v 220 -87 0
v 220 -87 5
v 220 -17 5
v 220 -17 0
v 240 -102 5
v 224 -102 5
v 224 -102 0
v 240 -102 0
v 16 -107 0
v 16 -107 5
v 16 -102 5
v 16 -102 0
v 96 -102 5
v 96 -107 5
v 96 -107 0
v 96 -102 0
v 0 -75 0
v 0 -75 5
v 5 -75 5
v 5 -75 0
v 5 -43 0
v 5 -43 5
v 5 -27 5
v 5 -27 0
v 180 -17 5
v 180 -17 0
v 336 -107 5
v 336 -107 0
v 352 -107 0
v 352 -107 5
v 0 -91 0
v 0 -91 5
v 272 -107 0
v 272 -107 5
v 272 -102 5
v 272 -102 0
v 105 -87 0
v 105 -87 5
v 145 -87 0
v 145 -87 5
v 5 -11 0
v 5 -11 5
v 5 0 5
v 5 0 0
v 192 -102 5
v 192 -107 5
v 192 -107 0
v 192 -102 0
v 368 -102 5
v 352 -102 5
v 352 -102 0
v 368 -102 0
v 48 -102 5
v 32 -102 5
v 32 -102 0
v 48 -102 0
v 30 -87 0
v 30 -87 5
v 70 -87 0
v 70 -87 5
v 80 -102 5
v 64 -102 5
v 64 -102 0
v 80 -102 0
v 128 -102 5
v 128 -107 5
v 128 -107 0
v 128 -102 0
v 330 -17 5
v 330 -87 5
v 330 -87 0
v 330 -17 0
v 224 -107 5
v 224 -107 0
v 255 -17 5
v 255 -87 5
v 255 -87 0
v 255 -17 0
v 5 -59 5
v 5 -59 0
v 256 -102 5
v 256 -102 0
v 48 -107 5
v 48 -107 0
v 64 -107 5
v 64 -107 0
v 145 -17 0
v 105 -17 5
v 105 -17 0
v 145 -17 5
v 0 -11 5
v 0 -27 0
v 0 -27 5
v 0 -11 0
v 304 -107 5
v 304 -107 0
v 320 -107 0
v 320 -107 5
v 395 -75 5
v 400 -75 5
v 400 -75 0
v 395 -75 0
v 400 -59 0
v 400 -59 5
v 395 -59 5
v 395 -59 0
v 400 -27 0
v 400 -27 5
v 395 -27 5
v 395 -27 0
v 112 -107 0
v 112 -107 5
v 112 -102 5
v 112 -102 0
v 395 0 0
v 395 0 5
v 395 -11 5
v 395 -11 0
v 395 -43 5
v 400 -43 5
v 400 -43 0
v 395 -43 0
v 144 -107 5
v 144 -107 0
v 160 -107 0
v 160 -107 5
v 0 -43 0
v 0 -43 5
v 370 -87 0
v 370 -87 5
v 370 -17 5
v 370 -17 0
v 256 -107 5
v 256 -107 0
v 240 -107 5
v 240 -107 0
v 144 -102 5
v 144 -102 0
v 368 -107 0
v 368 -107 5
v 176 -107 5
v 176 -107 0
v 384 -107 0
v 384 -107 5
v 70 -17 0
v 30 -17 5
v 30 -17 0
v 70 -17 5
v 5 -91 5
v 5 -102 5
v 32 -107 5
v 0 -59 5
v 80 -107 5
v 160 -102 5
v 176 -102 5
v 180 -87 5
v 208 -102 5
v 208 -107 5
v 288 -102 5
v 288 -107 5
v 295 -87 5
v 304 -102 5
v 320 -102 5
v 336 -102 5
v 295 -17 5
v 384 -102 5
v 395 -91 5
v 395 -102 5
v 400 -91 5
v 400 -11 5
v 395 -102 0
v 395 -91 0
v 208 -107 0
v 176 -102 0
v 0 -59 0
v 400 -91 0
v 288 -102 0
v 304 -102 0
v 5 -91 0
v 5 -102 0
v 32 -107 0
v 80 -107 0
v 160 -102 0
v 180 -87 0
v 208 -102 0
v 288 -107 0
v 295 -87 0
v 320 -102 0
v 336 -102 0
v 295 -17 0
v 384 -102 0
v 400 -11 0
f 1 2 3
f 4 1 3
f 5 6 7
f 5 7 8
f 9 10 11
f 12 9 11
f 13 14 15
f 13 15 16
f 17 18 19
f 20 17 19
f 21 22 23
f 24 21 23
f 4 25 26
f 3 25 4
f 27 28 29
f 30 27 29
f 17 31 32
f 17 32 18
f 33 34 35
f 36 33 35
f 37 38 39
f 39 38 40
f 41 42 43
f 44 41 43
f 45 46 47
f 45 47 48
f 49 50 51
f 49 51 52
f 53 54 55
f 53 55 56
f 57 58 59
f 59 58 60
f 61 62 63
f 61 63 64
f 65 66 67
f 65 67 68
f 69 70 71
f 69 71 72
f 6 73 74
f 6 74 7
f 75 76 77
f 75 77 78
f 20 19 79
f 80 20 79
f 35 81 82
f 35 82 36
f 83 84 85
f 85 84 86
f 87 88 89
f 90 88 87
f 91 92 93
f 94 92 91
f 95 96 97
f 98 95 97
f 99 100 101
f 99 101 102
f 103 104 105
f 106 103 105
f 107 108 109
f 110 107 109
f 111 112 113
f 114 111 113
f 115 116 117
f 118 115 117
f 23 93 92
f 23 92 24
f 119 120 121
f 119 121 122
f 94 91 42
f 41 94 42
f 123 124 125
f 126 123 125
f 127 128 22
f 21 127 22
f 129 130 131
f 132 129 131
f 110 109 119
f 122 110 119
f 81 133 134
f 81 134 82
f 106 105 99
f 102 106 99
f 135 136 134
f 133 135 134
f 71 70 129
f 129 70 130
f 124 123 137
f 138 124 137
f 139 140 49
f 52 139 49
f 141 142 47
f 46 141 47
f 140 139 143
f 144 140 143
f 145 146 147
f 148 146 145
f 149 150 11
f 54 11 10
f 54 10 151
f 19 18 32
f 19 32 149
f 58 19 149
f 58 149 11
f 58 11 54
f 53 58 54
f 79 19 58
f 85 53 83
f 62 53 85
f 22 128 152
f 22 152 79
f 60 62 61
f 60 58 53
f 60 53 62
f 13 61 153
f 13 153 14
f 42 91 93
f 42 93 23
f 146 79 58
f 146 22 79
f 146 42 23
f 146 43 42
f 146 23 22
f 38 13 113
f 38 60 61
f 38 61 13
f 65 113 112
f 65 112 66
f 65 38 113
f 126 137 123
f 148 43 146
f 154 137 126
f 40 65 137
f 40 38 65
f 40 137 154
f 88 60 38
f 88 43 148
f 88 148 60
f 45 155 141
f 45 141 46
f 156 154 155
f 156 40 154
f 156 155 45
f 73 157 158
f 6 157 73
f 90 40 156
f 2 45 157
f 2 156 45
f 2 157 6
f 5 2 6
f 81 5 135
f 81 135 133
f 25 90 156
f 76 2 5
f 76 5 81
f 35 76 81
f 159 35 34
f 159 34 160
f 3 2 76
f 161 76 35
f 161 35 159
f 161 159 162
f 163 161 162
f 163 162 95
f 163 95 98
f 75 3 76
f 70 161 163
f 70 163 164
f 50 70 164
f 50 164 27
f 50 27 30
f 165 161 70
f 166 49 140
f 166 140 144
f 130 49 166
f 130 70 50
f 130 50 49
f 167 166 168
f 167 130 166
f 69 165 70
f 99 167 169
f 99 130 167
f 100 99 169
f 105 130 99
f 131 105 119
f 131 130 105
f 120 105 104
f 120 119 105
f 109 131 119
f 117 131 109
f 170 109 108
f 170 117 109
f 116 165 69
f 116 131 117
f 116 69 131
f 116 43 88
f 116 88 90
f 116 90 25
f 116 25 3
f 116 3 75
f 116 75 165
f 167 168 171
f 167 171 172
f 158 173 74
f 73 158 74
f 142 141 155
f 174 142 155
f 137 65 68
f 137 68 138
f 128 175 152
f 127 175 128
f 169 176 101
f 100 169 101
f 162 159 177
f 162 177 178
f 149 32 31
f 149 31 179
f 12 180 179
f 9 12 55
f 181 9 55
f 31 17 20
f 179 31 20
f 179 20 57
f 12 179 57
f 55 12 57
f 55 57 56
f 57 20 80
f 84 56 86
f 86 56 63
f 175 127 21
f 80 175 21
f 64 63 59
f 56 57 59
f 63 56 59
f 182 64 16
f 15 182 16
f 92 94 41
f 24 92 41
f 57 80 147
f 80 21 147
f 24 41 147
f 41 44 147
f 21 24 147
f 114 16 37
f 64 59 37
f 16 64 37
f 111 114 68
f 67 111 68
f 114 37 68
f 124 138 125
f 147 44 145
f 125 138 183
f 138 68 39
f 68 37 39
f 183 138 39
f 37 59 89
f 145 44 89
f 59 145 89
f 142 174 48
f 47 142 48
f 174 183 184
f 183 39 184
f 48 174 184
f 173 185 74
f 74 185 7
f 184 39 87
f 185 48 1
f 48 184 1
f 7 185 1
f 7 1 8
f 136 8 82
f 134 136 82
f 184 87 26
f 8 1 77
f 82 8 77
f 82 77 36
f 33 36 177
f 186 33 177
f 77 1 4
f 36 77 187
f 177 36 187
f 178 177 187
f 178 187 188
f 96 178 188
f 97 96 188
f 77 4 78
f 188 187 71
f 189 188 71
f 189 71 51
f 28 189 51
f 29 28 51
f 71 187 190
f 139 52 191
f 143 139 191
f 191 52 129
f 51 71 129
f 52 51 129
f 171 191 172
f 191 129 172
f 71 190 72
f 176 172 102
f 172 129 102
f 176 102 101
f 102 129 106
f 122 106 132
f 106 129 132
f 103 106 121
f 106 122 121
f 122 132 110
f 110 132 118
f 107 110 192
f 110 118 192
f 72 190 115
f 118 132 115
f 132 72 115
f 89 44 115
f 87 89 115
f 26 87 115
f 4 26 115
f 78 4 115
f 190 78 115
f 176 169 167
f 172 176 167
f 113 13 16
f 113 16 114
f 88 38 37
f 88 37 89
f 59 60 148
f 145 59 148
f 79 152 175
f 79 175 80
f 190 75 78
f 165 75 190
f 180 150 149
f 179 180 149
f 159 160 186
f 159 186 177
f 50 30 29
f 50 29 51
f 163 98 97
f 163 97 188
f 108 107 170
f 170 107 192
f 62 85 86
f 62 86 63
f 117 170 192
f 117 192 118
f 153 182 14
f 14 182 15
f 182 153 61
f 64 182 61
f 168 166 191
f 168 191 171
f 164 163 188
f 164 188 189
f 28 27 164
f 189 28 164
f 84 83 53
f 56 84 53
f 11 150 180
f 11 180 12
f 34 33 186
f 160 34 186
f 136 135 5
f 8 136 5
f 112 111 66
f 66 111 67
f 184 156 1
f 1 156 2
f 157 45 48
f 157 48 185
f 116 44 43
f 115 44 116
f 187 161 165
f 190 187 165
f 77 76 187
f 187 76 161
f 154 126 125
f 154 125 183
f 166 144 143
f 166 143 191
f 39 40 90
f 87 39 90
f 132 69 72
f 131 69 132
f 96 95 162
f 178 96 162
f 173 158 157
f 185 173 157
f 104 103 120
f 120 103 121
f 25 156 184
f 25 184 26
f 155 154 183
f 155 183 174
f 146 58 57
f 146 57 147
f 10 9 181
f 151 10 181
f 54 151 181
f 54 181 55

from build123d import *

# Parameters (mm, degrees)
ESQUISSE1_W                = 400
ESQUISSE1_H                = 107
BOSS_EXTRU_1_DEPTH         = 5
ESQUISSE2_W                = 5
ESQUISSE2_H                = 16
ENL_V_MAT_EXTRU_1_DEPTH    = 5
R_P_TITION_LIN_AIRE1_COUNT = 4
R_P_TITION_LIN_AIRE1_PITCH = 32
SYM_TRIE1_COPY_1_SKETCH_W  = 5
SYM_TRIE1_COPY_1_SKETCH_H  = 16
SYM_TRIE1_COPY_1_DEPTH     = 5
SYM_TRIE1_COPY_2_SKETCH_W  = 5
SYM_TRIE1_COPY_2_SKETCH_H  = 16
SYM_TRIE1_COPY_2_DEPTH     = 5
SYM_TRIE1_COPY_3_SKETCH_W  = 5
SYM_TRIE1_COPY_3_SKETCH_H  = 16
SYM_TRIE1_COPY_3_DEPTH     = 5
ESQUISSE3_W                = 16
ESQUISSE3_H                = 5
ENL_V_MAT_EXTRU_2_DEPTH    = 5
R_P_TITION_LIN_AIRE2_COUNT = 13
R_P_TITION_LIN_AIRE2_PITCH = 32
ESQUISSE4_W                = 40
ESQUISSE4_H                = 70
ENL_V_MAT_EXTRU_3_DEPTH    = 10
R_P_TITION_LIN_AIRE3_COUNT = 5
R_P_TITION_LIN_AIRE3_PITCH = 75


with BuildPart() as part:
    # Esquisse1 → Boss.-Extru.1 (new body)
    with BuildSketch(Plane.XY):
        with Locations((200, -53.5)):
            Rectangle(ESQUISSE1_W, ESQUISSE1_H)
    extrude(amount=BOSS_EXTRU_1_DEPTH)

    # Esquisse2 → Enlèv. mat.-Extru.1 (cut)
    with BuildSketch(Plane.XY.offset(5)):
        with Locations((2.5, -99)):
            Rectangle(ESQUISSE2_W, ESQUISSE2_H)
    enl_v_mat_extru_1 = extrude(amount=-ENL_V_MAT_EXTRU_1_DEPTH, mode=Mode.SUBTRACT)

    # Répétition linéaire1: Enlèv. mat.-Extru.1 ×4
    with Locations(*[(0, i * R_P_TITION_LIN_AIRE1_PITCH, 0) for i in range(1, R_P_TITION_LIN_AIRE1_COUNT)]):
        add(enl_v_mat_extru_1, mode=Mode.SUBTRACT)

    # Symétrie1: Enlèv. mat.-Extru.1 across plane
    add(enl_v_mat_extru_1.mirror(Plane.ZY.offset(-200)), mode=Mode.SUBTRACT)

    # Symétrie1 copy 1 sketch → Symétrie1 copy 1 (cut)
    with BuildSketch(Plane(origin=(400, 32, 5), x_dir=(-1, 0, 0), z_dir=(0, 0, 1))):
        with Locations((2.5, 99)):
            Rectangle(SYM_TRIE1_COPY_1_SKETCH_W, SYM_TRIE1_COPY_1_SKETCH_H)
    extrude(amount=-SYM_TRIE1_COPY_1_DEPTH, mode=Mode.SUBTRACT)

    # Symétrie1 copy 2 sketch → Symétrie1 copy 2 (cut)
    with BuildSketch(Plane(origin=(400, 64, 5), x_dir=(-1, 0, 0), z_dir=(0, 0, 1))):
        with Locations((2.5, 99)):
            Rectangle(SYM_TRIE1_COPY_2_SKETCH_W, SYM_TRIE1_COPY_2_SKETCH_H)
    extrude(amount=-SYM_TRIE1_COPY_2_DEPTH, mode=Mode.SUBTRACT)

    # Symétrie1 copy 3 sketch → Symétrie1 copy 3 (cut)
    with BuildSketch(Plane(origin=(400, 96, 5), x_dir=(-1, 0, 0), z_dir=(0, 0, 1))):
        with Locations((2.5, 99)):
            Rectangle(SYM_TRIE1_COPY_3_SKETCH_W, SYM_TRIE1_COPY_3_SKETCH_H)
    extrude(amount=-SYM_TRIE1_COPY_3_DEPTH, mode=Mode.SUBTRACT)

    # Esquisse3 → Enlèv. mat.-Extru.2 (cut)
    with BuildSketch(Plane.XY.offset(5)):
        with Locations((8, -104.5)):
            Rectangle(ESQUISSE3_W, ESQUISSE3_H)
    enl_v_mat_extru_2 = extrude(amount=-ENL_V_MAT_EXTRU_2_DEPTH, mode=Mode.SUBTRACT)

    # Répétition linéaire2: Enlèv. mat.-Extru.2 ×13
    with Locations(*[(i * R_P_TITION_LIN_AIRE2_PITCH, 0, 0) for i in range(1, R_P_TITION_LIN_AIRE2_COUNT)]):
        add(enl_v_mat_extru_2, mode=Mode.SUBTRACT)

    # Esquisse4 → Enlèv. mat.-Extru.3 (cut)
    with BuildSketch(Plane.XY.offset(5)):
        with Locations((50, -52)):
            Rectangle(ESQUISSE4_W, ESQUISSE4_H)
    enl_v_mat_extru_3 = extrude(amount=-ENL_V_MAT_EXTRU_3_DEPTH, mode=Mode.SUBTRACT)

    # Répétition linéaire3: Enlèv. mat.-Extru.3 ×5
    with Locations(*[(i * R_P_TITION_LIN_AIRE3_PITCH, 0, 0) for i in range(1, R_P_TITION_LIN_AIRE3_COUNT)]):
        add(enl_v_mat_extru_3, mode=Mode.SUBTRACT)


solid = part.part
